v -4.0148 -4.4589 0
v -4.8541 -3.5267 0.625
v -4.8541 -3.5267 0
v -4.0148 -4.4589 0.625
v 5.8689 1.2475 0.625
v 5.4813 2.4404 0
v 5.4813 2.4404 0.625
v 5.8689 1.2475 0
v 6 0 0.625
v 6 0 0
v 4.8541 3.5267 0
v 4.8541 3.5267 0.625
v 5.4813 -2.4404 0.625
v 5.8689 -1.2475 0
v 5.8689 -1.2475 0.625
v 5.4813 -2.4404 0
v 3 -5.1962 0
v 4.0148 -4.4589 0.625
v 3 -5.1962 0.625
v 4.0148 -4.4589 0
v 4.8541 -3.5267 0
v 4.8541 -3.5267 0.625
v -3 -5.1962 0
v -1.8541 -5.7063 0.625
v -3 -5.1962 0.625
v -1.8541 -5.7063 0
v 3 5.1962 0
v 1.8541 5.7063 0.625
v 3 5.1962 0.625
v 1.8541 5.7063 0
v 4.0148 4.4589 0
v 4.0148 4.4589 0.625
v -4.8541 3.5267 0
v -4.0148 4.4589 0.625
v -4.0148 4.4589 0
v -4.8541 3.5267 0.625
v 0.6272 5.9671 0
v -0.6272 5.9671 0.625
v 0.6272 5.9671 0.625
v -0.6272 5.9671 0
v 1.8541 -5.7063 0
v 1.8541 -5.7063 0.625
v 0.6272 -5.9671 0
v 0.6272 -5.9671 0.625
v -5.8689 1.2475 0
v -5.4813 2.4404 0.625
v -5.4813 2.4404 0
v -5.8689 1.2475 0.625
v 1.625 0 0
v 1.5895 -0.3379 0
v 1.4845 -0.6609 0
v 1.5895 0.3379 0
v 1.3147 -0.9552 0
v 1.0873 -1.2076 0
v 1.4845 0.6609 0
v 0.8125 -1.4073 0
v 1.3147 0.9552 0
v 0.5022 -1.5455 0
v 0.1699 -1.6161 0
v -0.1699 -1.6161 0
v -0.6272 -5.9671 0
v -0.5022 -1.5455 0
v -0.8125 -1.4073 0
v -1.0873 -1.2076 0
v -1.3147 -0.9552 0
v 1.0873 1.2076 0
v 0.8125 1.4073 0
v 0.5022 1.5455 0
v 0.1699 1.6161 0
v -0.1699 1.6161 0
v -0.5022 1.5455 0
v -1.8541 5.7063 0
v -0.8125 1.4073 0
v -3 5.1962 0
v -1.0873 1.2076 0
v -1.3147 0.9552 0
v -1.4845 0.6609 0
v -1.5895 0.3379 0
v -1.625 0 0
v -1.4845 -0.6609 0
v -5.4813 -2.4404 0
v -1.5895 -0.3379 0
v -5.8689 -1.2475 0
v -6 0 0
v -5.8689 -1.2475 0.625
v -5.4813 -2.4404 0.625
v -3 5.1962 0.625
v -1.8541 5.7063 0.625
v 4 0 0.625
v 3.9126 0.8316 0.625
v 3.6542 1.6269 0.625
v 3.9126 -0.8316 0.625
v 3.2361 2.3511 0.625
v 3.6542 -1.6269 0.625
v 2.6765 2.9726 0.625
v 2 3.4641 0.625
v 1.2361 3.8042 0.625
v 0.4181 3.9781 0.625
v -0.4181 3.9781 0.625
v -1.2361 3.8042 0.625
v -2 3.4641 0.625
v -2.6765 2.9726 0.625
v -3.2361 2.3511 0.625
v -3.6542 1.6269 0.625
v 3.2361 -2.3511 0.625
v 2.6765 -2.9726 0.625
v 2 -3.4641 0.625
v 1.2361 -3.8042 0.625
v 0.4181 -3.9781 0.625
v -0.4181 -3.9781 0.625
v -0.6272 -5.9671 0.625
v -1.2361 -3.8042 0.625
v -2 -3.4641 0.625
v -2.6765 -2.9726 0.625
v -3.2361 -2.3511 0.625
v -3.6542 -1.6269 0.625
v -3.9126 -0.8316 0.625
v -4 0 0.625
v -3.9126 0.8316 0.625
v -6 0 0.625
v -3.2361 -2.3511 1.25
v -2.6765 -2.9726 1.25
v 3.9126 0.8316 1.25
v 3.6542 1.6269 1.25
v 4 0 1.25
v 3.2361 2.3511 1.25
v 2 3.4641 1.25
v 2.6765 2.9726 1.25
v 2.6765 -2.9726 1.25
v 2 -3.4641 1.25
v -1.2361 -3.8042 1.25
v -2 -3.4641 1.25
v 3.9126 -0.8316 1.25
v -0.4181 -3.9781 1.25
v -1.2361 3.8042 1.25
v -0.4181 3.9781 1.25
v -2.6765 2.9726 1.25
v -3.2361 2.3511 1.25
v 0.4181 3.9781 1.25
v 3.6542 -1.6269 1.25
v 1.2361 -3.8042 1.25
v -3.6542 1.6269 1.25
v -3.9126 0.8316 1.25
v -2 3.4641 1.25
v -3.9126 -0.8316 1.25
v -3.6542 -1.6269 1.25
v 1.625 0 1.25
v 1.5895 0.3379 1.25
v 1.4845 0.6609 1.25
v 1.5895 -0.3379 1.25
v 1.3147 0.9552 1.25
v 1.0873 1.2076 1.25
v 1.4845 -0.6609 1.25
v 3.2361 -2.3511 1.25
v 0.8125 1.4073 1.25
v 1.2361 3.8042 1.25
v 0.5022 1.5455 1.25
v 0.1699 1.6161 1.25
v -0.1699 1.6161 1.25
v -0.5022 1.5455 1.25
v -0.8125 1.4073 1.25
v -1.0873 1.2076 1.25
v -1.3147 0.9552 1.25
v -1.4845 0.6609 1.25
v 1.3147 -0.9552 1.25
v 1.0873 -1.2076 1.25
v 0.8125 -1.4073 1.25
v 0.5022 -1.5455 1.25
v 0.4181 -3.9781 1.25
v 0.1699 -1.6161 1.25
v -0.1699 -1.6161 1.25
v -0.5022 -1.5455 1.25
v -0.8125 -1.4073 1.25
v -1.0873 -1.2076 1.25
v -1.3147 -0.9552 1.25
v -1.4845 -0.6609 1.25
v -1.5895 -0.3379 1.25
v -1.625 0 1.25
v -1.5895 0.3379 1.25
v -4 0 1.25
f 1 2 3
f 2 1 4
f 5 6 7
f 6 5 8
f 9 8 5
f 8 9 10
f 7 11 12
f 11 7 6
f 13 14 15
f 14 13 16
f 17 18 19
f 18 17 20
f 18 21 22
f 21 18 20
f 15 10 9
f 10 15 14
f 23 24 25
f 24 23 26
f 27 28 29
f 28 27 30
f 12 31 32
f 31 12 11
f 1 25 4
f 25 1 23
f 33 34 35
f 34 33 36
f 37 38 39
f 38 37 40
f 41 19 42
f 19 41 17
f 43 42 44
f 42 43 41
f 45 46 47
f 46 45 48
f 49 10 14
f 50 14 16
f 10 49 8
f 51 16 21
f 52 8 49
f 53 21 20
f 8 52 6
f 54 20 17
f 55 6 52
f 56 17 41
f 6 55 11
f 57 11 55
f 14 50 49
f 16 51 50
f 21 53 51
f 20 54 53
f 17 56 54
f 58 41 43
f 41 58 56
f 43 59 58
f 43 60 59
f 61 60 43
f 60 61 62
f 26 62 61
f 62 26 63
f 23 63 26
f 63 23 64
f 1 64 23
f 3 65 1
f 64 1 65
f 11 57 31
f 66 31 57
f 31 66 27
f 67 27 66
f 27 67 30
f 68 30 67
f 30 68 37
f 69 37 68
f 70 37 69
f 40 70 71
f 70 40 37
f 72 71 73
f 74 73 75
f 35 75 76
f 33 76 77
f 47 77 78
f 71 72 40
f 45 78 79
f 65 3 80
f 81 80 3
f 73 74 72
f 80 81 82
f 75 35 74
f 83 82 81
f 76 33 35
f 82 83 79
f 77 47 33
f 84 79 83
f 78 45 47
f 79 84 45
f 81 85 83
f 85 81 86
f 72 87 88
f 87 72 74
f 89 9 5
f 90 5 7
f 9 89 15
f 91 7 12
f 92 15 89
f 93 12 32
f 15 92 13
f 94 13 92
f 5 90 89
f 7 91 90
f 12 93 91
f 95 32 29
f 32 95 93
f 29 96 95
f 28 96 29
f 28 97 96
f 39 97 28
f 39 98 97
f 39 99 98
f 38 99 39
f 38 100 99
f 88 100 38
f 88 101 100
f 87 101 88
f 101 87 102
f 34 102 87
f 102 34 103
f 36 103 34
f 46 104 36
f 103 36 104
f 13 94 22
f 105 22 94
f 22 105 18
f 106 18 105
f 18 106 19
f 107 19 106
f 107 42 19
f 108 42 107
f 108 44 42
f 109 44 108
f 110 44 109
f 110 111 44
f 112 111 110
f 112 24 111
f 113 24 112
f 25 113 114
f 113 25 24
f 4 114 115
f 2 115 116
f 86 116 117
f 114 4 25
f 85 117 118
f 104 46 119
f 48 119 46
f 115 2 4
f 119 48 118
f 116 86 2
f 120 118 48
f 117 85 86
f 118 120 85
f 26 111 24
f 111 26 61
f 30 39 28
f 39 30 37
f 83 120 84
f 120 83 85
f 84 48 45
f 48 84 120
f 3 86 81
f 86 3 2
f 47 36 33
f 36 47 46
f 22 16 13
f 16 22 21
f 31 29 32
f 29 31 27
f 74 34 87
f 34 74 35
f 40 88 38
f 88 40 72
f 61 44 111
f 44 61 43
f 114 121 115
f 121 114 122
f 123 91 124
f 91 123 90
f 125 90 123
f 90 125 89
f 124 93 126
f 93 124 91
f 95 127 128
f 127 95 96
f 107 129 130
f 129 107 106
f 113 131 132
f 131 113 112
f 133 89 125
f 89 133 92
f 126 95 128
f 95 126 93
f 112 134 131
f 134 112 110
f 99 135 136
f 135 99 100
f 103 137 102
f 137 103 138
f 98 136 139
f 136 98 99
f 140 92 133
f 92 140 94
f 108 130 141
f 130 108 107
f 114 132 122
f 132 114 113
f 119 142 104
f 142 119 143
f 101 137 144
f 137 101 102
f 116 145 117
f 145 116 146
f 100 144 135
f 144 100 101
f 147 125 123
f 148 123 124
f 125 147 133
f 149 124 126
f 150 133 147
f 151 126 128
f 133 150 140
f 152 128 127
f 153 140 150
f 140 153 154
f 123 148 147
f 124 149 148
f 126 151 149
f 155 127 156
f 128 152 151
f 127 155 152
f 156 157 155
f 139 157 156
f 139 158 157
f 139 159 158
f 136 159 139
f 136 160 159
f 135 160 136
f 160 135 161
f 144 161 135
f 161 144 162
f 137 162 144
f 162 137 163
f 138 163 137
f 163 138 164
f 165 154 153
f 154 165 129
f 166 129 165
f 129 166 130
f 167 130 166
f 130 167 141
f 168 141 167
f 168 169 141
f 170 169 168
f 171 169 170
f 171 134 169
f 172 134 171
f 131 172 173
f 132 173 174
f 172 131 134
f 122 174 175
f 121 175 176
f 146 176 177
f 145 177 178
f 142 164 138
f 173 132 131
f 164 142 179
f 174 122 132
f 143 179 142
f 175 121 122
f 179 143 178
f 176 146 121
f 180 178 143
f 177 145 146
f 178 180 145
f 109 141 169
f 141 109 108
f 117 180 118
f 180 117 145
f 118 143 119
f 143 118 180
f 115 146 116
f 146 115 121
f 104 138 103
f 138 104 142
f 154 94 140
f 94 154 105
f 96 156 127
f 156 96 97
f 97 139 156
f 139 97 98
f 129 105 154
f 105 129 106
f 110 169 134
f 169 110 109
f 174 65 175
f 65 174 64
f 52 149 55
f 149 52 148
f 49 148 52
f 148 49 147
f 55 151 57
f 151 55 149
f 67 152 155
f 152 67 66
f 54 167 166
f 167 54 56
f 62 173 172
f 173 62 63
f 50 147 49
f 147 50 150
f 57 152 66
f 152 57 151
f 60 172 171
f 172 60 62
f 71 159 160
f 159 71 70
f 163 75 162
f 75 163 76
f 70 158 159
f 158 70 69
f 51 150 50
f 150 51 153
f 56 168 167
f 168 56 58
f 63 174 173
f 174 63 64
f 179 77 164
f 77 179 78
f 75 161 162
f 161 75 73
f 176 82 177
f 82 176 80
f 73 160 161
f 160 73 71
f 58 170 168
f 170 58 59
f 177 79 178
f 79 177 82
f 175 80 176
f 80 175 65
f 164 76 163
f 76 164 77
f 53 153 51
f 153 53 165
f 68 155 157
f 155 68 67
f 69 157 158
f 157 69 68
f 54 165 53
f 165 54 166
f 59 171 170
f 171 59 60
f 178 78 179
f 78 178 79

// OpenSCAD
// file: axle.scad
include <../settings.scad>;

module make_axle_a(){

    h = track_wheel_width/2 - 0.2;

    difference(){
        union(){
            // main body
            // this should be slightly smaller than the hole on the idler wheel
            cylinder(
                d=track_wheel_hole_radius*2-2,
                h=h-motor_bearing_thickness);
            
            // nub sticking out to center the bearing
            // this should be slightly smaller than the hole on the bearing
            cylinder(d=track_axle_bearing_diameter-0.2, h=h);
        }
        // axle hole
        cylinder(
            d=screw_thread_diameter+tolerance*1.5,
            h=track_wheel_gap*2, center=true);
    }
}

module make_axle_b(){

    h = track_wheel_width_buffer;

    difference(){
        union(){
            // main body
            // this should be slightly larger than the hole on the idler wheel
            cylinder(
                d=track_wheel_hole_radius*2+2,
                h=h/2);
            
            // nub sticking out to center the bearing
            // this should be slightly smaller than the hole on the idler wheel
            cylinder(
                d=track_wheel_hole_radius*2-2,
                h=h);
        }
        // axle hole
        cylinder(
            d=screw_thread_diameter+tolerance*1.5,
            h=track_wheel_gap*2, center=true);
    }
}


make_axle_a();

//translate([0,15,0]) make_axle_b();
// file: ../settings.scad
// Common settings used by all scad files.

// ALL UNITS IN MILLIMETERS (MM)!!!

$fn = 30;//low-res but fast to render
//$fn = 50;//higher-res but slow to render

pi = 3.1415926535897932384626433832795;

max_footprint = 150; // 15x15 cm

bottom_clearance = 10;
bottom_clearance = 25.4/2+10;
//bottom_clearance = 30;

shell_alpha = 0.215;
//shell_alpha = 1.0;

tolerance = 0.5;

// Flat countersunk M2.5mm x 0.45mm machine screw.
screw_thread_diameter = 2.5;//2.8;//2.75;//2.4?
screw_thread_length = 5;//?
screw_head_diameter = 4.75; // M2.5
//screw_head_diameter = 5.2; // M3
screw_head_height = 1.5;//2;

screw_thread_diameter2 = 2;

unit_thickness = 5;
u = unit_thickness;

shell_thickness = unit_thickness;

// Show flags.
show_platform = 0;
show_head = 1;
show_head_shell = 0;
show_head_electronics_bb = 0;
show_battery = 1;
show_foot_cube = 0;
show_torso = 0;
show_motor = 0;
show_motor_plates = 1;
show_motor_inner_plates = 1;
show_motor_outer_plates = 1;
show_wheel = 0;//obsolete
show_tracks = 1;//
show_track_wheels = 1;
show_caster = 0;
show_rpi = 1;
show_vertical_plates = 1;//
show_horizontal_plates = 1;//
show_caster_plates = 0;//obsolete?
show_camera = 1;
show_screen = 0;
show_edge_mount = 1;
show_sonar_mount = 1;
show_recharge_mount = 1;
show_conduit = 1;
show_torso_shell = 1;
show_recharge_dock = 0;
show_head_tilt_axis = 0;
show_rpi_camera_axis = 0;
show_laser_axis = 0;

head_vertical_angle_tilt = 0;
//head_vertical_angle_tilt = 30;//max
//head_vertical_angle_tilt = 10;

torso_height = 120+20;

base_plate_diameter = max_footprint-unit_thickness*2;
base_plate_frame = 0;

head_height = 50;
head_offset_z = max_footprint/2;
head_middle_cutout = 85;

rpi_with_four_hats_and_clearance = 76;

qrd1114_w = 6.10;
qrd1114_l = 4.39;
qrd1114_h = 4.65;

dock_radius = 10;
dock_gripper_border = 2;
dock_gripper_instep = 0.9;
dock_gripper_cutout_tapper = 50;
dock_receiver_height = 5;

// Patriod Fuel+ 9000 mAh
battery_length = 90;
battery_width = 57;
battery_height = 23;
battery_offset_z = 30;//4;

wheel_diameter = 50;
wheel_offset_x = 65;
wheel_offset_z = wheel_diameter/2;
wheel_axle_diameter = 5;

//caster_diameter = 19.05; // 0.75 inches
caster_diameter = 25.45; // 1 inches
//caster_diameter = 15.875; // 5/8 inches
caster_holder_diameter = 30;//31;
caster_offset_y = base_plate_diameter/2 - caster_holder_diameter/2;

arduino_offset_x = 0;
arduino_offset_y = 0;
arduino_offset_z = 67;
arduino_offset_x2 = 0;
arduino_offset_y2 = -20;
arduino_offset_z2 = torso_height+bottom_clearance;

horizontal_plate_width = unit_thickness*8*2 - unit_thickness*2;
horizontal_plate_depth = unit_thickness*8*2;

vertical_plate_width = horizontal_plate_depth;
vertical_plate_height = unit_thickness*8;
vertical_plate_offset_x = wheel_offset_x-22.5;
vertical_plate_offset_z = vertical_plate_height/2 + unit_thickness/2;

vertical_battery_plate_height = 100 - 15;

caster_plate_width = horizontal_plate_width + unit_thickness*2;
caster_plate_mount_length = unit_thickness*4;
caster_plate_width_minor = caster_holder_diameter;

motor_switch_length = 20;
motor_switch_thickness = 6.5;
motor_switch_height = 11;
motor_switch_height_leads = 23;
motor_switch_on_height =  13.3;
motor_switch_hole_diameter = 2.5;
motor_switch_hole_offset_z = 6.5;//this plus diameter/2 is hole center from switch top
motor_switch_hole_spacing = 7.1;// holes are diameter/2 from this

motor_length = 60;
motor_width = 25;
motor_collar_width = 7;
motor_collar_height = 2.5;
motor_axle_width = 4;
motor_axle_height = 9.5;
motor_offset_x = 10;
//motor_offset_y = motor_width/2+5;
motor_offset_y = unit_thickness*3.5;
motor_offset_z = vertical_plate_height/2 - unit_thickness/2;//4;//30;
motor_mount_holes_dist = 17;
// motor countersink hole
motor_mount_holes_width = 3; // M3
motor_mount_holes_head_height = 2.2;
motor_mount_holes_head_width = 5.8;
motor_bearing_outer_diameter = 10;
motor_bearing_inner_diameter = 5.95;
motor_bearing_thickness = 2.5;

motor_unimount_idler_axle_d = screw_thread_diameter;
//motor_unimount_spacer_depth = 0.1;//too small
motor_unimount_spacer_depth = 0.5;

motor_arm_offset_y = -u*3;
motor_arm_offset_z = u*.5;

motor_plate_width = vertical_plate_width;
motor_plate_height = vertical_plate_height;
motor_plate_thickness = unit_thickness;
motor_plate_offset_z = vertical_plate_offset_z;

motor_plate_middle_thickness = 5;

wheel_hub_offset = u*3;

motor_hole_height_offset = -5;

nylon_spacer_outer_diameter = 6.35;
nylon_spacer_inner_diameter = 3.302;
nylon_spacer_length = 12.7;

track_width = unit_thickness*3;
track_offset_x = -50;
track_offset_z = .1;
//track_wheel_radius = 19;//original
track_wheel_radius = 14;
//track_wheel_hole_radius = (nylon_spacer_outer_diameter+1)/2;
track_wheel_hole_radius = motor_bearing_outer_diameter/2;

track_driver_hole_radius = (motor_axle_width)/2 + 0.1;
track_driver_set_screw_head_d = 4.1;
track_driver_set_screw_shaft_d = 2.4;
//track_wheel_width = 13.5;//original
track_wheel_width = u*2;
track_wheel_width_buffer = u*0.25;
track_offset = 3;        //distance from chassis
track_wheel_offset = track_offset;
//track_length = 250; // see tread_triangle.py, too big
//track_length = 240; // see tread_triangle.py
//track_length = 238; //inc/dec in 10 unit increments so notches match idlers
track_length = 228; //inc/dec in 10 unit increments so notches match idlers
track_radius = track_length/2/pi;
track_wheel_show_fancy = 1;
track_wheel_gap = track_wheel_width + track_wheel_width_buffer*2;
track_axle_bearing_diameter = motor_bearing_inner_diameter - 0.1;
track_tensioner_radius = 12;
track_nut_height = 3.5; //TODO
track_punchout_thickness = 0.25;//should be the same as the minimum layer thickness

head_slew_bearing_outer_diameter = 115;
head_slew_bearing_ring_thickness = 20;
head_slew_bearing_inner_diameter = head_slew_bearing_outer_diameter - head_slew_bearing_ring_thickness;
//head_slew_bearing_hole_diameter = head_slew_bearing_inner_diameter - head_slew_bearing_ring_thickness;
head_slew_bearing_hole_diameter = 12+tolerance; // slip ring https://www.adafruit.com/products/775
//head_slew_bearing_ball_diameter = 5;
head_slew_bearing_ball_diameter = 2.5; //u/2;
head_slew_bearing_height = u;//head_slew_bearing_ball_diameter*2;
head_slew_bearing_gap = 0.5;
head_slew_bearing_slew_gap = 0;
head_slew_bearing_gap_factor = 0.1;

neck_strut_width = u*7;
neck_strut_height = u*18;
neck_strut_spacing = u*8;

show_outer_race = 0;
show_inner_race_a = 1;
show_inner_race_b = 1;
show_balls = 0;
// main file
include <../settings.scad>;
use <axle.scad>;

make_axle_b();
